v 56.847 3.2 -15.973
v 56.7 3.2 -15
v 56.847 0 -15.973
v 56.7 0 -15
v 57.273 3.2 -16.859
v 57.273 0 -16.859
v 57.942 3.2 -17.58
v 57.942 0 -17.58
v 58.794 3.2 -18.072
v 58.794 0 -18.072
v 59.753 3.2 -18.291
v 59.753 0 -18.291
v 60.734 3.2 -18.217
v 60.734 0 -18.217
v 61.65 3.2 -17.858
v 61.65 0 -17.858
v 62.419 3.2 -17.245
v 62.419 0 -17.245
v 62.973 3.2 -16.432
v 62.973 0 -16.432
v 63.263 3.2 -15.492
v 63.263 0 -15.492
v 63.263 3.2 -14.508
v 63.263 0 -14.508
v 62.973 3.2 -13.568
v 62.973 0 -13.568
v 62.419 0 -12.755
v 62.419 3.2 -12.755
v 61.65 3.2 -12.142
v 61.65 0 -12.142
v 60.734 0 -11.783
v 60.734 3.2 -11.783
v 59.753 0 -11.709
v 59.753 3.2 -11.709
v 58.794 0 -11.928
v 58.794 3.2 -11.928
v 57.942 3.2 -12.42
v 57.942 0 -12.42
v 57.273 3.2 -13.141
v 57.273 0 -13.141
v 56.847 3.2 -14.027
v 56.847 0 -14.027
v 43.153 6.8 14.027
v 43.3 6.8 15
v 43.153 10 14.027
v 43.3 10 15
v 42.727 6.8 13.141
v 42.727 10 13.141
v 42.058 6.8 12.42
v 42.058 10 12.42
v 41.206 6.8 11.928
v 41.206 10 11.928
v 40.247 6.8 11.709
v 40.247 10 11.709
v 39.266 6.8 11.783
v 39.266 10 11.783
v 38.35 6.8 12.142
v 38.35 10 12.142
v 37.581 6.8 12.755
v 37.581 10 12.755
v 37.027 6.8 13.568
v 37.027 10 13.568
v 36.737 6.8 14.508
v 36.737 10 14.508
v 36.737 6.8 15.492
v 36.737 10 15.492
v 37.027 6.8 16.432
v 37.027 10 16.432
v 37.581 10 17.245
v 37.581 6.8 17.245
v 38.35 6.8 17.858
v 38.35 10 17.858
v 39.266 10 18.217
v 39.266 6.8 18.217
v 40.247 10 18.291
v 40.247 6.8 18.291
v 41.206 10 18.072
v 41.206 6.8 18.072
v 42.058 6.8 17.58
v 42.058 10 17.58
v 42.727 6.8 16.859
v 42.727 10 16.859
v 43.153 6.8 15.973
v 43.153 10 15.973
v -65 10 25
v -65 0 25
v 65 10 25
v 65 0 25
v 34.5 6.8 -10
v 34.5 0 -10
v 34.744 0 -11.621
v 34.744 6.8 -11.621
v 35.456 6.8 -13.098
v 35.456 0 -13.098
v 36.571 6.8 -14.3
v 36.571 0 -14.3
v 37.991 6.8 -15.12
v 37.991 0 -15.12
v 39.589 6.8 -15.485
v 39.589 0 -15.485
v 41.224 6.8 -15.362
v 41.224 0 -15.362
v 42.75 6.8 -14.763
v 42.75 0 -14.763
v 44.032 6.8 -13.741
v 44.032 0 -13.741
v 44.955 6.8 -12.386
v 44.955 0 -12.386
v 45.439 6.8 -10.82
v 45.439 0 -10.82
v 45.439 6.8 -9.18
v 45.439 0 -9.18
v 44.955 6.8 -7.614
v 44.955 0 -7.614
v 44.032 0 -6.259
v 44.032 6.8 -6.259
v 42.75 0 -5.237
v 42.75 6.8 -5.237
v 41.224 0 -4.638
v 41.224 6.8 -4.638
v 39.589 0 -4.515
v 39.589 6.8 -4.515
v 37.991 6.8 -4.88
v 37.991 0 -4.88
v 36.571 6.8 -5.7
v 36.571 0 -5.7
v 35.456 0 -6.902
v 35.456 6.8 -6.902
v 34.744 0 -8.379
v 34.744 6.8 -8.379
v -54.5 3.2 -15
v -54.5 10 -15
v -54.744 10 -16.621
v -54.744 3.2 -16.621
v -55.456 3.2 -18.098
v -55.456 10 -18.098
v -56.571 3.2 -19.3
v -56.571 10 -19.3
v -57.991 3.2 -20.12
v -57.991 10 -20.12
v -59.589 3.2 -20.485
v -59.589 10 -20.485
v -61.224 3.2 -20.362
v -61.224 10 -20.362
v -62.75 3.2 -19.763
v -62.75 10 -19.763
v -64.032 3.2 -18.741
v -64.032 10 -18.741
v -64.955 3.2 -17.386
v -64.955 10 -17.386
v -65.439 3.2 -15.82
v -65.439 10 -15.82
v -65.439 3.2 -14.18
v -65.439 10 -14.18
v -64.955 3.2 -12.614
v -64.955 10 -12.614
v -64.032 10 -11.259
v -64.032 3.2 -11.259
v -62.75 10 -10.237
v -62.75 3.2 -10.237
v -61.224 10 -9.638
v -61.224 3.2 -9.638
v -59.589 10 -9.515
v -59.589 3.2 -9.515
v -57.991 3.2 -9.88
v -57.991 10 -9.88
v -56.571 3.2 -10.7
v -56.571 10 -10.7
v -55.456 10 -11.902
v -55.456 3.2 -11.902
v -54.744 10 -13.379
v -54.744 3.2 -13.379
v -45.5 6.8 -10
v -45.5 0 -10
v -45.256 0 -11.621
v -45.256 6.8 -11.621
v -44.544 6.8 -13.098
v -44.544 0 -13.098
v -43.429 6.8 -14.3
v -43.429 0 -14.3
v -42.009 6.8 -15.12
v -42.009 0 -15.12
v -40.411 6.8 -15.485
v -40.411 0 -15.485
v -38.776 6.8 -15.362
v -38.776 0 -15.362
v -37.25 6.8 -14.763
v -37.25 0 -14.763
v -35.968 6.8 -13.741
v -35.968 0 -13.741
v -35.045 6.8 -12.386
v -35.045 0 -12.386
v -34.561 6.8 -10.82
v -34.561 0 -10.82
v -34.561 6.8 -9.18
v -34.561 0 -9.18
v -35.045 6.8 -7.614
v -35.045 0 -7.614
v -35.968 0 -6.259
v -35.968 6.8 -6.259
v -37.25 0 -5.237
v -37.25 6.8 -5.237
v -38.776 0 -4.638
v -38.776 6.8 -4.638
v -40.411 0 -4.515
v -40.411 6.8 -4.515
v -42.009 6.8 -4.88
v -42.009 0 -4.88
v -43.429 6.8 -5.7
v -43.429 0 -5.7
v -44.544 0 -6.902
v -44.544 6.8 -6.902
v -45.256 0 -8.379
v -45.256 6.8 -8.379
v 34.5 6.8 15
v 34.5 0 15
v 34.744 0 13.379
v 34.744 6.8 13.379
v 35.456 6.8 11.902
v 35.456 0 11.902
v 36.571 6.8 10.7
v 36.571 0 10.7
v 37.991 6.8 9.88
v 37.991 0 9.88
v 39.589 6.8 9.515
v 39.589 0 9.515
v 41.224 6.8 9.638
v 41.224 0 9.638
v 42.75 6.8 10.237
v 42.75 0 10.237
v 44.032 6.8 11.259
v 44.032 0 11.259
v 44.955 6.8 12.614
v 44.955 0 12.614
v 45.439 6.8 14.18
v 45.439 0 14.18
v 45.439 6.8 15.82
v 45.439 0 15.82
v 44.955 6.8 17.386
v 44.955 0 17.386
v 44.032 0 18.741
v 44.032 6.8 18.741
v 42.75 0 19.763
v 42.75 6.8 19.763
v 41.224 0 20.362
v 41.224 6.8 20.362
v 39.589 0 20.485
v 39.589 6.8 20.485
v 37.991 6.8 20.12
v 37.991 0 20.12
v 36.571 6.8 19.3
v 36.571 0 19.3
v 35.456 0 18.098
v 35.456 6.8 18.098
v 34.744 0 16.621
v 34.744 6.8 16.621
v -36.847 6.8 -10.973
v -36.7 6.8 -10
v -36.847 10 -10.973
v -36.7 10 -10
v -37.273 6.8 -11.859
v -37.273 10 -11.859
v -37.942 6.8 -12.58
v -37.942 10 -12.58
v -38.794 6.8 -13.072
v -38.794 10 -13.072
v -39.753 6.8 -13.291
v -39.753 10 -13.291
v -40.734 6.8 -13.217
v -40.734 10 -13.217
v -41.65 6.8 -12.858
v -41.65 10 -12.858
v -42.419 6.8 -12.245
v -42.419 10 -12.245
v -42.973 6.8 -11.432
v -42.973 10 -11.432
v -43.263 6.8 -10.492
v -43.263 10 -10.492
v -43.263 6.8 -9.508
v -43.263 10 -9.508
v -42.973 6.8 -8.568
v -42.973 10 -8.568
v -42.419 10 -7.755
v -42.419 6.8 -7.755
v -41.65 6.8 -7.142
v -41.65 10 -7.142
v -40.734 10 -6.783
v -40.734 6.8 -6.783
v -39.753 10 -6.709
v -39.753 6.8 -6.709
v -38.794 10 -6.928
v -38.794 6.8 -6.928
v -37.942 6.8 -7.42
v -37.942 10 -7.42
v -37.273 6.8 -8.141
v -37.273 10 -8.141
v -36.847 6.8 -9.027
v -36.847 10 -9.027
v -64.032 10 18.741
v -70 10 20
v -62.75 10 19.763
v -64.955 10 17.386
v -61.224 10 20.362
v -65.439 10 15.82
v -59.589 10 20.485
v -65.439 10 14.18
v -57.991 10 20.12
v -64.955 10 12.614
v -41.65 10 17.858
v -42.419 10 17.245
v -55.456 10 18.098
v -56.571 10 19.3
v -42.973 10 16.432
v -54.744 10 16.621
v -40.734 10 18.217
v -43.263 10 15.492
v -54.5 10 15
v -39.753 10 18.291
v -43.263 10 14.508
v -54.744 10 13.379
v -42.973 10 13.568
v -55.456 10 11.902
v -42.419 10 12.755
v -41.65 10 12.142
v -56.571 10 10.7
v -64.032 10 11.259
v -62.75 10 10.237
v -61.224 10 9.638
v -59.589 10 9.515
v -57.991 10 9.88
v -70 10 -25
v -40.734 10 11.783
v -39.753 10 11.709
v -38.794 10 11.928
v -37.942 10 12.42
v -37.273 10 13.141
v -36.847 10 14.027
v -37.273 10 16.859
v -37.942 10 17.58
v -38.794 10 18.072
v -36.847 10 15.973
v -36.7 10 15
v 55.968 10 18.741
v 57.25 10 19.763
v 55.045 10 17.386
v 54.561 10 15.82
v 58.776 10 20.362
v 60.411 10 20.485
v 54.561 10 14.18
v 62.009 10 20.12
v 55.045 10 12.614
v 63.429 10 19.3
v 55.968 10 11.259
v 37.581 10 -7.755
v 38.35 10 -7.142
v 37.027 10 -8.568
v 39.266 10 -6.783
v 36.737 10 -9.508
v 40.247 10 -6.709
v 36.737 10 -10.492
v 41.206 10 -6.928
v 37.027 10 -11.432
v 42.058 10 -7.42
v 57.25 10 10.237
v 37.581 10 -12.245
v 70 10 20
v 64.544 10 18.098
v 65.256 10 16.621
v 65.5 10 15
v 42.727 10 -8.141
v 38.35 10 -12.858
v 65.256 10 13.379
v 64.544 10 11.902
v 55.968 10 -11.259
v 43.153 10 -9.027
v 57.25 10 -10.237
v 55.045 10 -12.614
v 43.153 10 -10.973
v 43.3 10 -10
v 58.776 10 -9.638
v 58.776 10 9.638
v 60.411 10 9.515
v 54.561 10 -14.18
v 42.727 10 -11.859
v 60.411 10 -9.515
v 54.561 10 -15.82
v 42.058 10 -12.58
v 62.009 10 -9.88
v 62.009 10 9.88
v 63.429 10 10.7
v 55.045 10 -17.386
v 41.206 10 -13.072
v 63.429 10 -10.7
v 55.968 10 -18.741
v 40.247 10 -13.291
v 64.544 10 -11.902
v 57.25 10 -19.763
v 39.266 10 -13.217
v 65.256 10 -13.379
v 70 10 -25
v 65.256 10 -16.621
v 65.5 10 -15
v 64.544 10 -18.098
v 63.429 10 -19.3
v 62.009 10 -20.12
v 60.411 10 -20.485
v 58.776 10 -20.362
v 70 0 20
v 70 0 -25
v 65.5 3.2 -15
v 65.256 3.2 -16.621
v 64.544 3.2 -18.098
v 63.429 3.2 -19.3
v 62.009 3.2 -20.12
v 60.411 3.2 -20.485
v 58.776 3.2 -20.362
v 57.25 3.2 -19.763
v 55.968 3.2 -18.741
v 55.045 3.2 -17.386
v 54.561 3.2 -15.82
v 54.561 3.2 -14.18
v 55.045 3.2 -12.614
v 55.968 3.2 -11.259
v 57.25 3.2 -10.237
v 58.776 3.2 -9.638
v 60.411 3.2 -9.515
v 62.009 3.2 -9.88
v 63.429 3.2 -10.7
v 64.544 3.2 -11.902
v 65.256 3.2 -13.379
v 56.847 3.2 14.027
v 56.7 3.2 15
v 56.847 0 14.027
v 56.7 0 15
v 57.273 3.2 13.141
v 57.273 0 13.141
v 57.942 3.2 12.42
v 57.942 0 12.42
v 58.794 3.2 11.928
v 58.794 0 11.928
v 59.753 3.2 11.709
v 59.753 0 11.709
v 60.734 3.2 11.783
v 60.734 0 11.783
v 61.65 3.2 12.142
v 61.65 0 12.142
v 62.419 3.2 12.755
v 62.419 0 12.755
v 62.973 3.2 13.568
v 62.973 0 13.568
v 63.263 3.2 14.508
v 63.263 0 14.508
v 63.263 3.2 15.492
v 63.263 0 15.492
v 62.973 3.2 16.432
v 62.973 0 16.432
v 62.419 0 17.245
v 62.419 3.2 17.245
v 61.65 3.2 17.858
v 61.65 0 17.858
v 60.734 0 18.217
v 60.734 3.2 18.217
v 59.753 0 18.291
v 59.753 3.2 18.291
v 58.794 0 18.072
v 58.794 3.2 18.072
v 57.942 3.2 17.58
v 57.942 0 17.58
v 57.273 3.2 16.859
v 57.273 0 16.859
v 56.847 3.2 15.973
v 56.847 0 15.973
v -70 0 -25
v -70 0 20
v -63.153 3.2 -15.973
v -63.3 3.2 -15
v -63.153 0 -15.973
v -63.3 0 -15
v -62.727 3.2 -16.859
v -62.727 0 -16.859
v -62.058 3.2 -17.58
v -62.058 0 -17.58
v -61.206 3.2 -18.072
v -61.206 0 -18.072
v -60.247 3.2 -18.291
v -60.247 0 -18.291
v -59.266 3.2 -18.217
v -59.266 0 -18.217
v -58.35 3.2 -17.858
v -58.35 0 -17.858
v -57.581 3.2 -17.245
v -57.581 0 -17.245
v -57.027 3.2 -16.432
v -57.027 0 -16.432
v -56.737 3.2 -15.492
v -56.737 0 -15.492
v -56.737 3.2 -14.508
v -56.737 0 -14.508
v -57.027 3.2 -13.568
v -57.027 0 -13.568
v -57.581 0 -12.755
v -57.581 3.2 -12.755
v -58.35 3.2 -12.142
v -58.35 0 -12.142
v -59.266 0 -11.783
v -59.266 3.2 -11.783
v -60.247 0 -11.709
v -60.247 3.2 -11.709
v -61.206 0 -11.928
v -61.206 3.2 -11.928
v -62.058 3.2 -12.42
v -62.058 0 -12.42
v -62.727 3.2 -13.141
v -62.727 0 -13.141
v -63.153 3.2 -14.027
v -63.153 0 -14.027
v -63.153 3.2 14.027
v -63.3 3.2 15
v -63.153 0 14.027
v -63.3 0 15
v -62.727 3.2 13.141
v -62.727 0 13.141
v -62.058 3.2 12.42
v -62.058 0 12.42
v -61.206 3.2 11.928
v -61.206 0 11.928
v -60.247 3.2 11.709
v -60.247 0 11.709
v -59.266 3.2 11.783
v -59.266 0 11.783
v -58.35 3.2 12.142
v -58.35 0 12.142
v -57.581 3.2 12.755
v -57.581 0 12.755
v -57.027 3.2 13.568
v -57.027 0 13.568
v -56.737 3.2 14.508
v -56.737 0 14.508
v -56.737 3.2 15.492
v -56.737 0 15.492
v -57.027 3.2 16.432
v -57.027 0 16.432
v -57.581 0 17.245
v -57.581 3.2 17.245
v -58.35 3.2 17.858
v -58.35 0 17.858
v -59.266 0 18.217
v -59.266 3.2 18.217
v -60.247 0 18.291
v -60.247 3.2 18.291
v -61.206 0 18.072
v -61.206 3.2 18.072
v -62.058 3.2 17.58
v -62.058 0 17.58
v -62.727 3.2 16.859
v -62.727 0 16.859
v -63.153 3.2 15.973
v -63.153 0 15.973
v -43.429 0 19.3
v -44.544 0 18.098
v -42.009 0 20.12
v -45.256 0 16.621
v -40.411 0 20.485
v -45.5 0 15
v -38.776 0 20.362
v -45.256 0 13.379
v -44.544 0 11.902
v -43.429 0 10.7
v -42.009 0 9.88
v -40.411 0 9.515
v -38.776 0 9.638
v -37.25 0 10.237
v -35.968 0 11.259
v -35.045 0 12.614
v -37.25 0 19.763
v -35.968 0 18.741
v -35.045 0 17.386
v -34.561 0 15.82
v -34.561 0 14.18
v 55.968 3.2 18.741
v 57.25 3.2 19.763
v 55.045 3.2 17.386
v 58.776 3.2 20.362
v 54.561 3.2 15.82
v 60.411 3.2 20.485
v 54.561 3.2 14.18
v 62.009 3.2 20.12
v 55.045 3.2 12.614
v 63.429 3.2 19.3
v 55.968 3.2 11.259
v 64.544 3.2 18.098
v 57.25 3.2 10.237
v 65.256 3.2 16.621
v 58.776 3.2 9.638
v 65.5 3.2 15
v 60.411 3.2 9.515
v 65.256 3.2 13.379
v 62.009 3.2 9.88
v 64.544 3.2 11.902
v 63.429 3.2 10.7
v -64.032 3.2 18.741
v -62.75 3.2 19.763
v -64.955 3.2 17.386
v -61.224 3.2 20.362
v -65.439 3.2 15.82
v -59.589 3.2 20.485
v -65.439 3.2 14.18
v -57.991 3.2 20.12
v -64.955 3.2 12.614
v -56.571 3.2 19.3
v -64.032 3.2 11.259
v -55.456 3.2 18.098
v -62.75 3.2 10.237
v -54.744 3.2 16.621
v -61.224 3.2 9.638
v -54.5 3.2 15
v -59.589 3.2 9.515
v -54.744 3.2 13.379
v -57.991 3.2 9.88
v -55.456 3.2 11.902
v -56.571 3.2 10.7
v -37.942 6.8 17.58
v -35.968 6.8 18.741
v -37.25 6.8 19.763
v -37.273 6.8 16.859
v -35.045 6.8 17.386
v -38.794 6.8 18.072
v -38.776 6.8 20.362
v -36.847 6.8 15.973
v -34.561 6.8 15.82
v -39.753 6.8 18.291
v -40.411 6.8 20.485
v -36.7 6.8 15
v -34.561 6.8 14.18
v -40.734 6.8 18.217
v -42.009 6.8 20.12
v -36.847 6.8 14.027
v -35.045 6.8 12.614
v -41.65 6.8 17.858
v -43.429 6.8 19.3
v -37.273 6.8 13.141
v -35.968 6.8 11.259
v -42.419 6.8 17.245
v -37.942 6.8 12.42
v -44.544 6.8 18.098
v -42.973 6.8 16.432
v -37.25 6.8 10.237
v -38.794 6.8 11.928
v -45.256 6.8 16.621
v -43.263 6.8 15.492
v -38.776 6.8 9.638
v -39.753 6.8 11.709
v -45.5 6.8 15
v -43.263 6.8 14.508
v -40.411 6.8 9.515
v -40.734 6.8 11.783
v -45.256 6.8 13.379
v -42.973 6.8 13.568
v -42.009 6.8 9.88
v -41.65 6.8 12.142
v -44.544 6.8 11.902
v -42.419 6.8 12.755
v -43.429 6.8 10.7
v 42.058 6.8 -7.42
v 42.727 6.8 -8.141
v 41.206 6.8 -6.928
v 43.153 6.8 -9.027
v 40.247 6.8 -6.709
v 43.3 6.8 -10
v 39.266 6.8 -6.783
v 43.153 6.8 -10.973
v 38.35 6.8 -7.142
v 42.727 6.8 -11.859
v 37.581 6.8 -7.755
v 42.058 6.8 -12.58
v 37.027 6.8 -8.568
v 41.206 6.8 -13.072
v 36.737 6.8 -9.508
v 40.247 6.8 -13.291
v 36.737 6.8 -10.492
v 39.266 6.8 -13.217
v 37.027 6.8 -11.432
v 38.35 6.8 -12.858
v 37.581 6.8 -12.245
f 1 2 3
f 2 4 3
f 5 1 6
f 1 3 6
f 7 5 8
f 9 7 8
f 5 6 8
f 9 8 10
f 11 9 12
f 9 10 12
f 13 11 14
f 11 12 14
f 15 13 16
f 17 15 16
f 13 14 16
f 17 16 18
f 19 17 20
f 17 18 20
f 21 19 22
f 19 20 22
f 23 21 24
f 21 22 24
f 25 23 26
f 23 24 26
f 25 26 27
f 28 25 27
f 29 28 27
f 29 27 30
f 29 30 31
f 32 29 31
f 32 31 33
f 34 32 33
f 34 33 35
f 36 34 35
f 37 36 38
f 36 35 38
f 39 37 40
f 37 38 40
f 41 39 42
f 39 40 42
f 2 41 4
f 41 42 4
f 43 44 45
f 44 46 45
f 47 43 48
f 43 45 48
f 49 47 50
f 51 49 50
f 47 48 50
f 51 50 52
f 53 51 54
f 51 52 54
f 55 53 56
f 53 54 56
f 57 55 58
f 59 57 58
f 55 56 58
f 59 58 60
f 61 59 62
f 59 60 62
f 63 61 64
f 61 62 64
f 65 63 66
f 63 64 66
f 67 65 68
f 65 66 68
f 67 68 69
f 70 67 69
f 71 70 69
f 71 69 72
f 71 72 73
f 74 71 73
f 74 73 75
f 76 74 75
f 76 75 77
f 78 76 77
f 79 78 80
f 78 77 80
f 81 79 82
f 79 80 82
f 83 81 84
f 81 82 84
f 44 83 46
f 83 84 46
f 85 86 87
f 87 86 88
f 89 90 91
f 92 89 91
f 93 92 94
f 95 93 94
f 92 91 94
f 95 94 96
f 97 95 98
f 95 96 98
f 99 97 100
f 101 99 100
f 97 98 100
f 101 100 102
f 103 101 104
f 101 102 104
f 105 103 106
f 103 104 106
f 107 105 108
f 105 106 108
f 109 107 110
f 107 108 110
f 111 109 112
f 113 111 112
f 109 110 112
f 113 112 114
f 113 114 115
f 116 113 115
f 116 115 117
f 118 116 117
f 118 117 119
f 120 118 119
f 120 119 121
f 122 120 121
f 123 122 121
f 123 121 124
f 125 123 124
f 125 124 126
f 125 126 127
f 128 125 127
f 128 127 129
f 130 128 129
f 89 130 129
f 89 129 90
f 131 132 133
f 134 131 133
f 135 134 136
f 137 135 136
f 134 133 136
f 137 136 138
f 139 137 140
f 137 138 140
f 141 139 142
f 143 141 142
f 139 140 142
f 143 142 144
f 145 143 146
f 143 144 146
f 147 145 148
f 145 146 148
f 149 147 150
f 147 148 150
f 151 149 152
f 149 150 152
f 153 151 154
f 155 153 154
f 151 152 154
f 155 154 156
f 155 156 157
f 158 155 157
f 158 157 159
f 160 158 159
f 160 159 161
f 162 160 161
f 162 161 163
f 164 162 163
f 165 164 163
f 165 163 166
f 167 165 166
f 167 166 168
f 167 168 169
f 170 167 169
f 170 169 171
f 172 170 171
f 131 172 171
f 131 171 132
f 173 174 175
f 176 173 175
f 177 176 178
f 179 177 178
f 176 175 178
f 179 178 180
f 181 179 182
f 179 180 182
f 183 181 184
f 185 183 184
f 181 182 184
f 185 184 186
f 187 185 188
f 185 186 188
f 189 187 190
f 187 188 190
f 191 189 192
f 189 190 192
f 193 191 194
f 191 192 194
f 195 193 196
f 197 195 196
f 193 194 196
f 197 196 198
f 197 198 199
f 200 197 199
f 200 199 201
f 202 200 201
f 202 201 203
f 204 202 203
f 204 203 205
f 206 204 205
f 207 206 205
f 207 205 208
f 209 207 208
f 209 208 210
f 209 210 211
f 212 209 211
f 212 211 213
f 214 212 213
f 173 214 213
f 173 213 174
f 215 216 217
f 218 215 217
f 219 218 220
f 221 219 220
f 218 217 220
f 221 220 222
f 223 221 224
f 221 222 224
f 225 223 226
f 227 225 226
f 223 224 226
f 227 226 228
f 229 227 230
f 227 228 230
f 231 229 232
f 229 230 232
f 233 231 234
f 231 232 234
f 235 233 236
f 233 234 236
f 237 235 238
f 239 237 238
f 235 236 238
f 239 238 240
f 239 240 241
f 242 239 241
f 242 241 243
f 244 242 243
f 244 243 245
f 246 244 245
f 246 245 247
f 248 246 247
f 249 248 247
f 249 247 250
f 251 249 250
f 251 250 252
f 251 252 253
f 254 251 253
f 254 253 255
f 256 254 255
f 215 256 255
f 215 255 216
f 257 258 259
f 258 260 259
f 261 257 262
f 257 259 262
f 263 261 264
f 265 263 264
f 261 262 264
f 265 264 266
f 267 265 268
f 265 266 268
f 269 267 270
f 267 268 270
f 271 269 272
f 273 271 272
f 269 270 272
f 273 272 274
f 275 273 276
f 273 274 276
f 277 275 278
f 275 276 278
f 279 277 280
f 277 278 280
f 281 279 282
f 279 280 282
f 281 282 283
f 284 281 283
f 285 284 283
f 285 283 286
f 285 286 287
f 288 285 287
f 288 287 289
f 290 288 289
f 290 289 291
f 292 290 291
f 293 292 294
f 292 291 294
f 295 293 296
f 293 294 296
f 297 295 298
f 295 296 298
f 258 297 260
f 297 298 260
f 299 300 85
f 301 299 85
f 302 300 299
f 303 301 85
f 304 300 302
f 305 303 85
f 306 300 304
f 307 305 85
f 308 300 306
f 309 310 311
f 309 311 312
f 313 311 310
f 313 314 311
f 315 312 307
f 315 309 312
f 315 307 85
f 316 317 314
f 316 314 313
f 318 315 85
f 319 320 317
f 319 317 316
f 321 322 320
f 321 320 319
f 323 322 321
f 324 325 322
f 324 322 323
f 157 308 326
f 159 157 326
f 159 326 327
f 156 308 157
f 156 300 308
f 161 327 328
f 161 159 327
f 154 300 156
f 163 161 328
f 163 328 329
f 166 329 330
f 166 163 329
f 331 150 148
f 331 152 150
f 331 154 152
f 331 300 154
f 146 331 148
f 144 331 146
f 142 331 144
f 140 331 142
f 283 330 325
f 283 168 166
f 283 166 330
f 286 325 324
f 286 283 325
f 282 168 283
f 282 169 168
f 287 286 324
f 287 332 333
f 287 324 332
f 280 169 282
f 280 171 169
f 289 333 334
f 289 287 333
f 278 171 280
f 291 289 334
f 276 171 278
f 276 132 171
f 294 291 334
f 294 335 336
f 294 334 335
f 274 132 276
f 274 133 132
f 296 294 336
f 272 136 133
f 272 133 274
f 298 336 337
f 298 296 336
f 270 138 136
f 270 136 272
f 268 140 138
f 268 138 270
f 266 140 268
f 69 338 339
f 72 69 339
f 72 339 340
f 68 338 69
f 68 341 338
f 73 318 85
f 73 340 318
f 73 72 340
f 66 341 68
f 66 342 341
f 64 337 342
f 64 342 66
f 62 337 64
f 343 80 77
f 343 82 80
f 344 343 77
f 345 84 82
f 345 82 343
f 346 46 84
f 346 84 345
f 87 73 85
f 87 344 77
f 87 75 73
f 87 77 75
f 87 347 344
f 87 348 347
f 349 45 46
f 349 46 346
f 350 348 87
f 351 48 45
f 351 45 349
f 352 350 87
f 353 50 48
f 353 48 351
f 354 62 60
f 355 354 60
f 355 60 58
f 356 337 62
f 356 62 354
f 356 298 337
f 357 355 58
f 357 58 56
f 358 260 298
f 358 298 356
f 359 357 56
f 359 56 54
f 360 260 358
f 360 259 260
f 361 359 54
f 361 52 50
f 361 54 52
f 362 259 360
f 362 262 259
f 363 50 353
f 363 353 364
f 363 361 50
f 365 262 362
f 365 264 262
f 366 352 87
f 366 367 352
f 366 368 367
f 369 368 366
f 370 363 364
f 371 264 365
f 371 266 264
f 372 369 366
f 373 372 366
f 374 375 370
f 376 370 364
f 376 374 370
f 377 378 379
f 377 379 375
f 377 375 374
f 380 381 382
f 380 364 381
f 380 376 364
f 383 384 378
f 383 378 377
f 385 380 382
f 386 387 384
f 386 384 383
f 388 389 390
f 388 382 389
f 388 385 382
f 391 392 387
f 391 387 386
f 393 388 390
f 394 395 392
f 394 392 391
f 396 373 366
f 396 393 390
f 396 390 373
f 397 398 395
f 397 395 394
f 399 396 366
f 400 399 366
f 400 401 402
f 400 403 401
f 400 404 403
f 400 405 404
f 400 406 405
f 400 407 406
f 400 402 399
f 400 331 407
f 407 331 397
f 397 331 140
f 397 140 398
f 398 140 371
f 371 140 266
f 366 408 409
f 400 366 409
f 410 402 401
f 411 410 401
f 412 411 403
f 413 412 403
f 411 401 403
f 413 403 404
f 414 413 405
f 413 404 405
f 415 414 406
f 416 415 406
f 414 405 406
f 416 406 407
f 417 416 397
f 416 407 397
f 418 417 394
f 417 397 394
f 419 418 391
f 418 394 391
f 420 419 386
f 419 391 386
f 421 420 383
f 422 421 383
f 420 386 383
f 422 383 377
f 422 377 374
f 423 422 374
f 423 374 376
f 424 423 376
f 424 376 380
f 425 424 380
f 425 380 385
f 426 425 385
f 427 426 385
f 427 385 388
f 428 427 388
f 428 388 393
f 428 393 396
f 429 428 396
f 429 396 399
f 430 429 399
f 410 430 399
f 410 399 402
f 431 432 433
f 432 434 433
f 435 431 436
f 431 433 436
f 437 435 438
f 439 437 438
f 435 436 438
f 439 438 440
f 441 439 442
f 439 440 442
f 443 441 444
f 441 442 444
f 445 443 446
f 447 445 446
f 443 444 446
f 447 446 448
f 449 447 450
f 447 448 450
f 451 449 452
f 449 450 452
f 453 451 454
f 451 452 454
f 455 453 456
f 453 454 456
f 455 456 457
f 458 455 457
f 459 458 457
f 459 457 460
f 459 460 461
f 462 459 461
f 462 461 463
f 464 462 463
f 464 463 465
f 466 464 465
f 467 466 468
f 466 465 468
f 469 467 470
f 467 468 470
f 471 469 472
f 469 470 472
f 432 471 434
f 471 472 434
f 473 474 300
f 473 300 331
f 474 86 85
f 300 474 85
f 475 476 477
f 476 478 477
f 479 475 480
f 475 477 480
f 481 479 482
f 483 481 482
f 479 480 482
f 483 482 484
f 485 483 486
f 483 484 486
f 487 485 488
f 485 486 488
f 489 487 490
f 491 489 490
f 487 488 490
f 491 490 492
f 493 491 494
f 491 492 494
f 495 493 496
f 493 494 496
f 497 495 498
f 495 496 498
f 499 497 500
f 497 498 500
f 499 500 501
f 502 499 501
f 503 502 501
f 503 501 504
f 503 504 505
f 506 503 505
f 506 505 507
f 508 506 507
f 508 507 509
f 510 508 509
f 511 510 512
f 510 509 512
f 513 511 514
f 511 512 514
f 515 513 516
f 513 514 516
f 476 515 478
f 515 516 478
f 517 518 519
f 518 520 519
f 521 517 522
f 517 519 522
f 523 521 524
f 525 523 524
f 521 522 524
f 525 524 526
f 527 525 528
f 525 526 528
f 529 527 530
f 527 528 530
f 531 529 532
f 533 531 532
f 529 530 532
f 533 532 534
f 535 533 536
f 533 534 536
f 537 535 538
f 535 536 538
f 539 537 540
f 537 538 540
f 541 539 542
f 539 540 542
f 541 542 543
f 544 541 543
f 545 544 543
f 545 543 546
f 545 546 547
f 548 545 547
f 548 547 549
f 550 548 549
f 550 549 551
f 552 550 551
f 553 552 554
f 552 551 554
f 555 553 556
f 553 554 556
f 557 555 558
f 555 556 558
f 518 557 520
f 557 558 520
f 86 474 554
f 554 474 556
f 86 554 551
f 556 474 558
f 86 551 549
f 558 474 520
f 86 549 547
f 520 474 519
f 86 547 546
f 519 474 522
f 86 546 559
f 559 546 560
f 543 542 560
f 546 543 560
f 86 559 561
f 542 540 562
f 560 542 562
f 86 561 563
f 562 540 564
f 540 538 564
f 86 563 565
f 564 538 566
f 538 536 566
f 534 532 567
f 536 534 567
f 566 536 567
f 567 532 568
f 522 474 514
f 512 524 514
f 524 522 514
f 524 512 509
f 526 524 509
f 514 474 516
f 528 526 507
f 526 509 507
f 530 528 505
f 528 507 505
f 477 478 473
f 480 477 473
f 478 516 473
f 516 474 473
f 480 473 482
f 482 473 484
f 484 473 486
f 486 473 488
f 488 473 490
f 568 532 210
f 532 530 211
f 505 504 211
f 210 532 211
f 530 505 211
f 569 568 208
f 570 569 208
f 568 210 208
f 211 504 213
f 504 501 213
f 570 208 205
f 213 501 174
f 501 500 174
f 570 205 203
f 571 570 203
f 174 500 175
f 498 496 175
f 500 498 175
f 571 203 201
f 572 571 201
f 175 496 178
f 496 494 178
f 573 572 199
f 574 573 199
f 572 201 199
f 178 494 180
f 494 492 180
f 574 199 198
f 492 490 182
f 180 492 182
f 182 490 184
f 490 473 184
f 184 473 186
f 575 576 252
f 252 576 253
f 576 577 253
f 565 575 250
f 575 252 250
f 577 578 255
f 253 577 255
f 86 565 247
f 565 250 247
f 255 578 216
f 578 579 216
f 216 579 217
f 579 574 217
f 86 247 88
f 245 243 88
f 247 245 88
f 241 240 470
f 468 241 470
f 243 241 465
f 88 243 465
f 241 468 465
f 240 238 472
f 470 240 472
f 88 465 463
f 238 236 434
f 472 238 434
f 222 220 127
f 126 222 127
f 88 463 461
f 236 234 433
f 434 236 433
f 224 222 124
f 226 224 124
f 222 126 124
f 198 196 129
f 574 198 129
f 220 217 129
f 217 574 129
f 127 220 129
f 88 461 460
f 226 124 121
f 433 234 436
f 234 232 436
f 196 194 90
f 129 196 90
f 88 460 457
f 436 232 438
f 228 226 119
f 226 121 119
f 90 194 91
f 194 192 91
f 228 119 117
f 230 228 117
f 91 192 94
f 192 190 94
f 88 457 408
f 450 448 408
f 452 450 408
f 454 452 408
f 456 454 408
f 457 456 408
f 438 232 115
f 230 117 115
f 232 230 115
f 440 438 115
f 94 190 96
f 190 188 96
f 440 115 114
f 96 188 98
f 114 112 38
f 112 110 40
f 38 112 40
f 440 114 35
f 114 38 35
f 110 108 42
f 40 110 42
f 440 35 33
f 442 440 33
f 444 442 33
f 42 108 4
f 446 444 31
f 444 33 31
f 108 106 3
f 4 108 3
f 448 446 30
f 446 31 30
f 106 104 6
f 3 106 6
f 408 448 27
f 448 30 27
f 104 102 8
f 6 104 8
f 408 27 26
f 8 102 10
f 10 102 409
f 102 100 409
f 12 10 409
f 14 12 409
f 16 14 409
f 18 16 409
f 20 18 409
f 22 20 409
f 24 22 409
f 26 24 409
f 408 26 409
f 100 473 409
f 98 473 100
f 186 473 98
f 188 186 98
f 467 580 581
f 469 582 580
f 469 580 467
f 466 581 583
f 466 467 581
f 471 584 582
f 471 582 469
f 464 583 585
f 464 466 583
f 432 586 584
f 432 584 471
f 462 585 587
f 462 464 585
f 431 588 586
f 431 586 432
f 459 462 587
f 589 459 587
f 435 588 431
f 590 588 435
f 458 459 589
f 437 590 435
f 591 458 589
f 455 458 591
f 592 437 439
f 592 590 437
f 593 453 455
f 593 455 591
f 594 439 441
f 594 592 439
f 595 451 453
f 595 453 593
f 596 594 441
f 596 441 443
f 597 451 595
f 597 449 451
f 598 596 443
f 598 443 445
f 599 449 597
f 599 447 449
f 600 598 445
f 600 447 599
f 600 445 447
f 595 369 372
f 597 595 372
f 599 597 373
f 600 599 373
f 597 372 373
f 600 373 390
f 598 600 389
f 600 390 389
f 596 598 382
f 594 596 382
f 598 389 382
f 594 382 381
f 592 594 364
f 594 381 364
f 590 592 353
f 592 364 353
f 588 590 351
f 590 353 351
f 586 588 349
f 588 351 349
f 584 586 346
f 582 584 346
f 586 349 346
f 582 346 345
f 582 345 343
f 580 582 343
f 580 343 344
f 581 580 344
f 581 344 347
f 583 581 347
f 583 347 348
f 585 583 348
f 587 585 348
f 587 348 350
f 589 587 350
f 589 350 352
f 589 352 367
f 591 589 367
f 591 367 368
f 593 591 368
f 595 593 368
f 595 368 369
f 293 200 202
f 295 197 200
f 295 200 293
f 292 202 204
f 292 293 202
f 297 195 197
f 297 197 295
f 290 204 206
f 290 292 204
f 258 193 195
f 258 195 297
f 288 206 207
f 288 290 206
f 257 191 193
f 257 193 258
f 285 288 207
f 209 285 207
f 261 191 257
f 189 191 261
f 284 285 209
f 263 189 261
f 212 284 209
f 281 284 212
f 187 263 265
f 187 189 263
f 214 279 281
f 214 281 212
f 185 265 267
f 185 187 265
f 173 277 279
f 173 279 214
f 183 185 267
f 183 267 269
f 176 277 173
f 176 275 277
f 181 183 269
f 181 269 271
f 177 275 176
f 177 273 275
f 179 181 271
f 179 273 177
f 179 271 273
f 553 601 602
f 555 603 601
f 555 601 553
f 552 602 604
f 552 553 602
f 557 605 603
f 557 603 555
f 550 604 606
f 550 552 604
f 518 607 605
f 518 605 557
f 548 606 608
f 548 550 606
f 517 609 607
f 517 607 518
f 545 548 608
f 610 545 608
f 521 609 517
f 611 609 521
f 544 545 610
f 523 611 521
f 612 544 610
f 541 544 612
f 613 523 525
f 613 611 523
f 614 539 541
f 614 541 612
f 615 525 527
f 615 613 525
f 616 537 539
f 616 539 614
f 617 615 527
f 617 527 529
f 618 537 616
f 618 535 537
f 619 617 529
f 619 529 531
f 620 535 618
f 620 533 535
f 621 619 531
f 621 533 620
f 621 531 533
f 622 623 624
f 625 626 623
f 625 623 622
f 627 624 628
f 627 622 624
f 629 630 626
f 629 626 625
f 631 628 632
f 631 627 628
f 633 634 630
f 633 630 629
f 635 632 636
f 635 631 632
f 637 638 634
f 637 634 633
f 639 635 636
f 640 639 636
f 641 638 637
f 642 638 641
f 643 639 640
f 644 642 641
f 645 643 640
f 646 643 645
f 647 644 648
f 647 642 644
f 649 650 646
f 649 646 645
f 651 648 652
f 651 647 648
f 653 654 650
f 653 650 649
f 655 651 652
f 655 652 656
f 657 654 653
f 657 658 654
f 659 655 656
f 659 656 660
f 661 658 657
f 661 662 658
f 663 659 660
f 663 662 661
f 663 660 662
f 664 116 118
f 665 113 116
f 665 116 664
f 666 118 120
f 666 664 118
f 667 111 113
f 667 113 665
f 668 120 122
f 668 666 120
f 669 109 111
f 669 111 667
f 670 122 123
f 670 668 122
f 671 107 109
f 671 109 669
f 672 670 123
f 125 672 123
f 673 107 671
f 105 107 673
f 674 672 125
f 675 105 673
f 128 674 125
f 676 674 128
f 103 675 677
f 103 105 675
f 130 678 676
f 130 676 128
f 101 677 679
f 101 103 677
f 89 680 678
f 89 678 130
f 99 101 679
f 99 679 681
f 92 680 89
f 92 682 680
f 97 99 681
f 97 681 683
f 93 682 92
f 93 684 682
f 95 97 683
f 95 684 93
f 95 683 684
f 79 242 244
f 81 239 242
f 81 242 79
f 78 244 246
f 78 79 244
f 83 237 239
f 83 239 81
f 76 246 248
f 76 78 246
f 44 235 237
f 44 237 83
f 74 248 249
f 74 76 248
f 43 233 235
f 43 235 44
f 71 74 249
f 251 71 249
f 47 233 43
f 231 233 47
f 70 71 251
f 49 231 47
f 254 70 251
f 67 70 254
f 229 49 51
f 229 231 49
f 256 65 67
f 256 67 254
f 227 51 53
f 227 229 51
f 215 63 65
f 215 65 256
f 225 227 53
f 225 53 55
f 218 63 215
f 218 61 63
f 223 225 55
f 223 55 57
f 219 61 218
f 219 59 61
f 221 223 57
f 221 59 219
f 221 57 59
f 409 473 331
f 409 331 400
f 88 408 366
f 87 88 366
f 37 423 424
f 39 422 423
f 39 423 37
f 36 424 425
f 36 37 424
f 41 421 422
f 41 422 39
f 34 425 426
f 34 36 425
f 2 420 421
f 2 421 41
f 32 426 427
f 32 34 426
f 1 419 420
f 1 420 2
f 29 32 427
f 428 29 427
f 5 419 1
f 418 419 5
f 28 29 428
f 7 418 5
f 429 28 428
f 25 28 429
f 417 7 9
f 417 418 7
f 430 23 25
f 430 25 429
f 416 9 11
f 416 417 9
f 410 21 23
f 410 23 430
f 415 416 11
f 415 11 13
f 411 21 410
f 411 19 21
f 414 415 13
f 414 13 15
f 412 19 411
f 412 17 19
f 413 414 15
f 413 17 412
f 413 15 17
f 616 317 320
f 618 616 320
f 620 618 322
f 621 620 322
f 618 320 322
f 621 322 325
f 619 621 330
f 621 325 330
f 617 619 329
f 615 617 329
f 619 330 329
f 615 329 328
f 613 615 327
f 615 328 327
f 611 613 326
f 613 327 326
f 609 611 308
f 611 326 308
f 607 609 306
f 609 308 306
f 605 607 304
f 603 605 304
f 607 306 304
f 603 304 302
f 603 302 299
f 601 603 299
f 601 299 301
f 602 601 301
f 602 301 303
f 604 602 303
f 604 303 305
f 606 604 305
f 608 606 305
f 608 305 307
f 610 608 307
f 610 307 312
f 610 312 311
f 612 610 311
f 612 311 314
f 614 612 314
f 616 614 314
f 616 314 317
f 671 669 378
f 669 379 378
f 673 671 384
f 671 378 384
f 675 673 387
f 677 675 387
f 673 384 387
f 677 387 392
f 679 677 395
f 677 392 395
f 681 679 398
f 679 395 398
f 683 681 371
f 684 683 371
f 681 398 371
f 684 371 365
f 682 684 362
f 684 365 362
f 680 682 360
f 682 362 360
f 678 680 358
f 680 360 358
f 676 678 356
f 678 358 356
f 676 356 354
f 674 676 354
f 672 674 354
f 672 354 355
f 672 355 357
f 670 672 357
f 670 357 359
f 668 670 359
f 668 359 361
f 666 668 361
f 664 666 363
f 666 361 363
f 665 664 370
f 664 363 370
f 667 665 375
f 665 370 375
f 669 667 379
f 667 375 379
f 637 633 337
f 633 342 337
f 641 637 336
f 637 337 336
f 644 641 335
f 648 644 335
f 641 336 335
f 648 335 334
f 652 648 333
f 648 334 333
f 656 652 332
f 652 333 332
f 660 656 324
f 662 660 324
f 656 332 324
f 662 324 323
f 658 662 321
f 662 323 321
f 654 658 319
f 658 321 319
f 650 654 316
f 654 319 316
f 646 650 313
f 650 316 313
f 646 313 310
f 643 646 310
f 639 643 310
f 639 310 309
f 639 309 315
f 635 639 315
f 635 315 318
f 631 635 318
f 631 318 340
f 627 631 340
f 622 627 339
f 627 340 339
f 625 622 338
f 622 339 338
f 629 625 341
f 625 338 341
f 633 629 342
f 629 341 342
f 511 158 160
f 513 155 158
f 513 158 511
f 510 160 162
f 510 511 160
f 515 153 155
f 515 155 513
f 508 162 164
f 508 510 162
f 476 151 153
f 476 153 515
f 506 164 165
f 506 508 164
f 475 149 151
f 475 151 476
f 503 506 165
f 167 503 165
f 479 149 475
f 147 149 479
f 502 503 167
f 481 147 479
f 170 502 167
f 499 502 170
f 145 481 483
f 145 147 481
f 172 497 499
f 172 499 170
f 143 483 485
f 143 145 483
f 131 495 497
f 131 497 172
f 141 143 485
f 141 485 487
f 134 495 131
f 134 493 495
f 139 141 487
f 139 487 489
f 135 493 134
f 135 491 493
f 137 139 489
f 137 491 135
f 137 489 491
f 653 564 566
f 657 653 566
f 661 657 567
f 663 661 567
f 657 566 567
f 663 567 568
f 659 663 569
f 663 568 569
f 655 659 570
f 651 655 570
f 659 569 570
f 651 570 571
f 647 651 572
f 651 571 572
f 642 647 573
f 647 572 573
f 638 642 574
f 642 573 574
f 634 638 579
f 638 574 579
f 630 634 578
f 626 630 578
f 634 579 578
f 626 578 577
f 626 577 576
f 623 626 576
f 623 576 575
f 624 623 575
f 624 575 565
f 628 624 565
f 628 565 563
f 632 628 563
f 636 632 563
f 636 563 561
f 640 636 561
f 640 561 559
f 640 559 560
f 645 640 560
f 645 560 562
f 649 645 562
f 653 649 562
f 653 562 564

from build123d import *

# Parameters (mm, degrees)
SKETCH1_W                                            = 140
SKETCH1_H                                            = 50
BOSS_EXTRUDE1_DEPTH                                  = 10
CBORE_FOR_M6_HEXAGON_SOCKET_HEAD_CAP_SCR_D           = 6.6
CBORE_FOR_M6_HEXAGON_SOCKET_HEAD_CAP_SCR_CBORE_D     = 11
CBORE_FOR_M6_HEXAGON_SOCKET_HEAD_CAP_SCR_CBORE_DEPTH = 6.8
CBORE_FOR_M6_HEXAGON_SOCKET_HEAD_CAP_2_D             = 6.6
CBORE_FOR_M6_HEXAGON_SOCKET_HEAD_CAP_2_CBORE_D       = 11
CBORE_FOR_M6_HEXAGON_SOCKET_HEAD_CAP_2_CBORE_DEPTH   = 6.8
CHAMFER1_SIZE                                        = 5


with BuildPart() as part:
    # Sketch1 → Boss-Extrude1 (new body)
    with BuildSketch(Plane(origin=(0, 0, 0), x_dir=(1, 0, 0), z_dir=(0, 1, 0))):
        Rectangle(SKETCH1_W, SKETCH1_H)
    extrude(amount=BOSS_EXTRUDE1_DEPTH)

    # CBORE for M6 Hexagon socket head cap scr (through all)
    with Locations(Plane(origin=(0, 10, 0), x_dir=(1, 0, 0), z_dir=(0, 1, 0))):
        with Locations((-60, 15), (60, 15), (60, -15), (-60, -15)):
            CounterBoreHole(CBORE_FOR_M6_HEXAGON_SOCKET_HEAD_CAP_SCR_D / 2, CBORE_FOR_M6_HEXAGON_SOCKET_HEAD_CAP_SCR_CBORE_D / 2, CBORE_FOR_M6_HEXAGON_SOCKET_HEAD_CAP_SCR_CBORE_DEPTH)

    # CBORE for M6 Hexagon socket head cap 2 (through all)
    with Locations(Plane(origin=(0, 0, 0), x_dir=(-1, 0, 0), z_dir=(0, -1, 0))):
        with Locations((-40, 10), (-40, -15), (40, -15), (40, 10)):
            CounterBoreHole(CBORE_FOR_M6_HEXAGON_SOCKET_HEAD_CAP_2_D / 2, CBORE_FOR_M6_HEXAGON_SOCKET_HEAD_CAP_2_CBORE_D / 2, CBORE_FOR_M6_HEXAGON_SOCKET_HEAD_CAP_2_CBORE_DEPTH)

    # Chamfer1
    chamfer1_edges = [part.edges().sort_by_distance(p)[0] for p in [
        (70, 5, 25),
        (-70, 5, 25),
    ]]
    chamfer(chamfer1_edges, length=CHAMFER1_SIZE)


solid = part.part
